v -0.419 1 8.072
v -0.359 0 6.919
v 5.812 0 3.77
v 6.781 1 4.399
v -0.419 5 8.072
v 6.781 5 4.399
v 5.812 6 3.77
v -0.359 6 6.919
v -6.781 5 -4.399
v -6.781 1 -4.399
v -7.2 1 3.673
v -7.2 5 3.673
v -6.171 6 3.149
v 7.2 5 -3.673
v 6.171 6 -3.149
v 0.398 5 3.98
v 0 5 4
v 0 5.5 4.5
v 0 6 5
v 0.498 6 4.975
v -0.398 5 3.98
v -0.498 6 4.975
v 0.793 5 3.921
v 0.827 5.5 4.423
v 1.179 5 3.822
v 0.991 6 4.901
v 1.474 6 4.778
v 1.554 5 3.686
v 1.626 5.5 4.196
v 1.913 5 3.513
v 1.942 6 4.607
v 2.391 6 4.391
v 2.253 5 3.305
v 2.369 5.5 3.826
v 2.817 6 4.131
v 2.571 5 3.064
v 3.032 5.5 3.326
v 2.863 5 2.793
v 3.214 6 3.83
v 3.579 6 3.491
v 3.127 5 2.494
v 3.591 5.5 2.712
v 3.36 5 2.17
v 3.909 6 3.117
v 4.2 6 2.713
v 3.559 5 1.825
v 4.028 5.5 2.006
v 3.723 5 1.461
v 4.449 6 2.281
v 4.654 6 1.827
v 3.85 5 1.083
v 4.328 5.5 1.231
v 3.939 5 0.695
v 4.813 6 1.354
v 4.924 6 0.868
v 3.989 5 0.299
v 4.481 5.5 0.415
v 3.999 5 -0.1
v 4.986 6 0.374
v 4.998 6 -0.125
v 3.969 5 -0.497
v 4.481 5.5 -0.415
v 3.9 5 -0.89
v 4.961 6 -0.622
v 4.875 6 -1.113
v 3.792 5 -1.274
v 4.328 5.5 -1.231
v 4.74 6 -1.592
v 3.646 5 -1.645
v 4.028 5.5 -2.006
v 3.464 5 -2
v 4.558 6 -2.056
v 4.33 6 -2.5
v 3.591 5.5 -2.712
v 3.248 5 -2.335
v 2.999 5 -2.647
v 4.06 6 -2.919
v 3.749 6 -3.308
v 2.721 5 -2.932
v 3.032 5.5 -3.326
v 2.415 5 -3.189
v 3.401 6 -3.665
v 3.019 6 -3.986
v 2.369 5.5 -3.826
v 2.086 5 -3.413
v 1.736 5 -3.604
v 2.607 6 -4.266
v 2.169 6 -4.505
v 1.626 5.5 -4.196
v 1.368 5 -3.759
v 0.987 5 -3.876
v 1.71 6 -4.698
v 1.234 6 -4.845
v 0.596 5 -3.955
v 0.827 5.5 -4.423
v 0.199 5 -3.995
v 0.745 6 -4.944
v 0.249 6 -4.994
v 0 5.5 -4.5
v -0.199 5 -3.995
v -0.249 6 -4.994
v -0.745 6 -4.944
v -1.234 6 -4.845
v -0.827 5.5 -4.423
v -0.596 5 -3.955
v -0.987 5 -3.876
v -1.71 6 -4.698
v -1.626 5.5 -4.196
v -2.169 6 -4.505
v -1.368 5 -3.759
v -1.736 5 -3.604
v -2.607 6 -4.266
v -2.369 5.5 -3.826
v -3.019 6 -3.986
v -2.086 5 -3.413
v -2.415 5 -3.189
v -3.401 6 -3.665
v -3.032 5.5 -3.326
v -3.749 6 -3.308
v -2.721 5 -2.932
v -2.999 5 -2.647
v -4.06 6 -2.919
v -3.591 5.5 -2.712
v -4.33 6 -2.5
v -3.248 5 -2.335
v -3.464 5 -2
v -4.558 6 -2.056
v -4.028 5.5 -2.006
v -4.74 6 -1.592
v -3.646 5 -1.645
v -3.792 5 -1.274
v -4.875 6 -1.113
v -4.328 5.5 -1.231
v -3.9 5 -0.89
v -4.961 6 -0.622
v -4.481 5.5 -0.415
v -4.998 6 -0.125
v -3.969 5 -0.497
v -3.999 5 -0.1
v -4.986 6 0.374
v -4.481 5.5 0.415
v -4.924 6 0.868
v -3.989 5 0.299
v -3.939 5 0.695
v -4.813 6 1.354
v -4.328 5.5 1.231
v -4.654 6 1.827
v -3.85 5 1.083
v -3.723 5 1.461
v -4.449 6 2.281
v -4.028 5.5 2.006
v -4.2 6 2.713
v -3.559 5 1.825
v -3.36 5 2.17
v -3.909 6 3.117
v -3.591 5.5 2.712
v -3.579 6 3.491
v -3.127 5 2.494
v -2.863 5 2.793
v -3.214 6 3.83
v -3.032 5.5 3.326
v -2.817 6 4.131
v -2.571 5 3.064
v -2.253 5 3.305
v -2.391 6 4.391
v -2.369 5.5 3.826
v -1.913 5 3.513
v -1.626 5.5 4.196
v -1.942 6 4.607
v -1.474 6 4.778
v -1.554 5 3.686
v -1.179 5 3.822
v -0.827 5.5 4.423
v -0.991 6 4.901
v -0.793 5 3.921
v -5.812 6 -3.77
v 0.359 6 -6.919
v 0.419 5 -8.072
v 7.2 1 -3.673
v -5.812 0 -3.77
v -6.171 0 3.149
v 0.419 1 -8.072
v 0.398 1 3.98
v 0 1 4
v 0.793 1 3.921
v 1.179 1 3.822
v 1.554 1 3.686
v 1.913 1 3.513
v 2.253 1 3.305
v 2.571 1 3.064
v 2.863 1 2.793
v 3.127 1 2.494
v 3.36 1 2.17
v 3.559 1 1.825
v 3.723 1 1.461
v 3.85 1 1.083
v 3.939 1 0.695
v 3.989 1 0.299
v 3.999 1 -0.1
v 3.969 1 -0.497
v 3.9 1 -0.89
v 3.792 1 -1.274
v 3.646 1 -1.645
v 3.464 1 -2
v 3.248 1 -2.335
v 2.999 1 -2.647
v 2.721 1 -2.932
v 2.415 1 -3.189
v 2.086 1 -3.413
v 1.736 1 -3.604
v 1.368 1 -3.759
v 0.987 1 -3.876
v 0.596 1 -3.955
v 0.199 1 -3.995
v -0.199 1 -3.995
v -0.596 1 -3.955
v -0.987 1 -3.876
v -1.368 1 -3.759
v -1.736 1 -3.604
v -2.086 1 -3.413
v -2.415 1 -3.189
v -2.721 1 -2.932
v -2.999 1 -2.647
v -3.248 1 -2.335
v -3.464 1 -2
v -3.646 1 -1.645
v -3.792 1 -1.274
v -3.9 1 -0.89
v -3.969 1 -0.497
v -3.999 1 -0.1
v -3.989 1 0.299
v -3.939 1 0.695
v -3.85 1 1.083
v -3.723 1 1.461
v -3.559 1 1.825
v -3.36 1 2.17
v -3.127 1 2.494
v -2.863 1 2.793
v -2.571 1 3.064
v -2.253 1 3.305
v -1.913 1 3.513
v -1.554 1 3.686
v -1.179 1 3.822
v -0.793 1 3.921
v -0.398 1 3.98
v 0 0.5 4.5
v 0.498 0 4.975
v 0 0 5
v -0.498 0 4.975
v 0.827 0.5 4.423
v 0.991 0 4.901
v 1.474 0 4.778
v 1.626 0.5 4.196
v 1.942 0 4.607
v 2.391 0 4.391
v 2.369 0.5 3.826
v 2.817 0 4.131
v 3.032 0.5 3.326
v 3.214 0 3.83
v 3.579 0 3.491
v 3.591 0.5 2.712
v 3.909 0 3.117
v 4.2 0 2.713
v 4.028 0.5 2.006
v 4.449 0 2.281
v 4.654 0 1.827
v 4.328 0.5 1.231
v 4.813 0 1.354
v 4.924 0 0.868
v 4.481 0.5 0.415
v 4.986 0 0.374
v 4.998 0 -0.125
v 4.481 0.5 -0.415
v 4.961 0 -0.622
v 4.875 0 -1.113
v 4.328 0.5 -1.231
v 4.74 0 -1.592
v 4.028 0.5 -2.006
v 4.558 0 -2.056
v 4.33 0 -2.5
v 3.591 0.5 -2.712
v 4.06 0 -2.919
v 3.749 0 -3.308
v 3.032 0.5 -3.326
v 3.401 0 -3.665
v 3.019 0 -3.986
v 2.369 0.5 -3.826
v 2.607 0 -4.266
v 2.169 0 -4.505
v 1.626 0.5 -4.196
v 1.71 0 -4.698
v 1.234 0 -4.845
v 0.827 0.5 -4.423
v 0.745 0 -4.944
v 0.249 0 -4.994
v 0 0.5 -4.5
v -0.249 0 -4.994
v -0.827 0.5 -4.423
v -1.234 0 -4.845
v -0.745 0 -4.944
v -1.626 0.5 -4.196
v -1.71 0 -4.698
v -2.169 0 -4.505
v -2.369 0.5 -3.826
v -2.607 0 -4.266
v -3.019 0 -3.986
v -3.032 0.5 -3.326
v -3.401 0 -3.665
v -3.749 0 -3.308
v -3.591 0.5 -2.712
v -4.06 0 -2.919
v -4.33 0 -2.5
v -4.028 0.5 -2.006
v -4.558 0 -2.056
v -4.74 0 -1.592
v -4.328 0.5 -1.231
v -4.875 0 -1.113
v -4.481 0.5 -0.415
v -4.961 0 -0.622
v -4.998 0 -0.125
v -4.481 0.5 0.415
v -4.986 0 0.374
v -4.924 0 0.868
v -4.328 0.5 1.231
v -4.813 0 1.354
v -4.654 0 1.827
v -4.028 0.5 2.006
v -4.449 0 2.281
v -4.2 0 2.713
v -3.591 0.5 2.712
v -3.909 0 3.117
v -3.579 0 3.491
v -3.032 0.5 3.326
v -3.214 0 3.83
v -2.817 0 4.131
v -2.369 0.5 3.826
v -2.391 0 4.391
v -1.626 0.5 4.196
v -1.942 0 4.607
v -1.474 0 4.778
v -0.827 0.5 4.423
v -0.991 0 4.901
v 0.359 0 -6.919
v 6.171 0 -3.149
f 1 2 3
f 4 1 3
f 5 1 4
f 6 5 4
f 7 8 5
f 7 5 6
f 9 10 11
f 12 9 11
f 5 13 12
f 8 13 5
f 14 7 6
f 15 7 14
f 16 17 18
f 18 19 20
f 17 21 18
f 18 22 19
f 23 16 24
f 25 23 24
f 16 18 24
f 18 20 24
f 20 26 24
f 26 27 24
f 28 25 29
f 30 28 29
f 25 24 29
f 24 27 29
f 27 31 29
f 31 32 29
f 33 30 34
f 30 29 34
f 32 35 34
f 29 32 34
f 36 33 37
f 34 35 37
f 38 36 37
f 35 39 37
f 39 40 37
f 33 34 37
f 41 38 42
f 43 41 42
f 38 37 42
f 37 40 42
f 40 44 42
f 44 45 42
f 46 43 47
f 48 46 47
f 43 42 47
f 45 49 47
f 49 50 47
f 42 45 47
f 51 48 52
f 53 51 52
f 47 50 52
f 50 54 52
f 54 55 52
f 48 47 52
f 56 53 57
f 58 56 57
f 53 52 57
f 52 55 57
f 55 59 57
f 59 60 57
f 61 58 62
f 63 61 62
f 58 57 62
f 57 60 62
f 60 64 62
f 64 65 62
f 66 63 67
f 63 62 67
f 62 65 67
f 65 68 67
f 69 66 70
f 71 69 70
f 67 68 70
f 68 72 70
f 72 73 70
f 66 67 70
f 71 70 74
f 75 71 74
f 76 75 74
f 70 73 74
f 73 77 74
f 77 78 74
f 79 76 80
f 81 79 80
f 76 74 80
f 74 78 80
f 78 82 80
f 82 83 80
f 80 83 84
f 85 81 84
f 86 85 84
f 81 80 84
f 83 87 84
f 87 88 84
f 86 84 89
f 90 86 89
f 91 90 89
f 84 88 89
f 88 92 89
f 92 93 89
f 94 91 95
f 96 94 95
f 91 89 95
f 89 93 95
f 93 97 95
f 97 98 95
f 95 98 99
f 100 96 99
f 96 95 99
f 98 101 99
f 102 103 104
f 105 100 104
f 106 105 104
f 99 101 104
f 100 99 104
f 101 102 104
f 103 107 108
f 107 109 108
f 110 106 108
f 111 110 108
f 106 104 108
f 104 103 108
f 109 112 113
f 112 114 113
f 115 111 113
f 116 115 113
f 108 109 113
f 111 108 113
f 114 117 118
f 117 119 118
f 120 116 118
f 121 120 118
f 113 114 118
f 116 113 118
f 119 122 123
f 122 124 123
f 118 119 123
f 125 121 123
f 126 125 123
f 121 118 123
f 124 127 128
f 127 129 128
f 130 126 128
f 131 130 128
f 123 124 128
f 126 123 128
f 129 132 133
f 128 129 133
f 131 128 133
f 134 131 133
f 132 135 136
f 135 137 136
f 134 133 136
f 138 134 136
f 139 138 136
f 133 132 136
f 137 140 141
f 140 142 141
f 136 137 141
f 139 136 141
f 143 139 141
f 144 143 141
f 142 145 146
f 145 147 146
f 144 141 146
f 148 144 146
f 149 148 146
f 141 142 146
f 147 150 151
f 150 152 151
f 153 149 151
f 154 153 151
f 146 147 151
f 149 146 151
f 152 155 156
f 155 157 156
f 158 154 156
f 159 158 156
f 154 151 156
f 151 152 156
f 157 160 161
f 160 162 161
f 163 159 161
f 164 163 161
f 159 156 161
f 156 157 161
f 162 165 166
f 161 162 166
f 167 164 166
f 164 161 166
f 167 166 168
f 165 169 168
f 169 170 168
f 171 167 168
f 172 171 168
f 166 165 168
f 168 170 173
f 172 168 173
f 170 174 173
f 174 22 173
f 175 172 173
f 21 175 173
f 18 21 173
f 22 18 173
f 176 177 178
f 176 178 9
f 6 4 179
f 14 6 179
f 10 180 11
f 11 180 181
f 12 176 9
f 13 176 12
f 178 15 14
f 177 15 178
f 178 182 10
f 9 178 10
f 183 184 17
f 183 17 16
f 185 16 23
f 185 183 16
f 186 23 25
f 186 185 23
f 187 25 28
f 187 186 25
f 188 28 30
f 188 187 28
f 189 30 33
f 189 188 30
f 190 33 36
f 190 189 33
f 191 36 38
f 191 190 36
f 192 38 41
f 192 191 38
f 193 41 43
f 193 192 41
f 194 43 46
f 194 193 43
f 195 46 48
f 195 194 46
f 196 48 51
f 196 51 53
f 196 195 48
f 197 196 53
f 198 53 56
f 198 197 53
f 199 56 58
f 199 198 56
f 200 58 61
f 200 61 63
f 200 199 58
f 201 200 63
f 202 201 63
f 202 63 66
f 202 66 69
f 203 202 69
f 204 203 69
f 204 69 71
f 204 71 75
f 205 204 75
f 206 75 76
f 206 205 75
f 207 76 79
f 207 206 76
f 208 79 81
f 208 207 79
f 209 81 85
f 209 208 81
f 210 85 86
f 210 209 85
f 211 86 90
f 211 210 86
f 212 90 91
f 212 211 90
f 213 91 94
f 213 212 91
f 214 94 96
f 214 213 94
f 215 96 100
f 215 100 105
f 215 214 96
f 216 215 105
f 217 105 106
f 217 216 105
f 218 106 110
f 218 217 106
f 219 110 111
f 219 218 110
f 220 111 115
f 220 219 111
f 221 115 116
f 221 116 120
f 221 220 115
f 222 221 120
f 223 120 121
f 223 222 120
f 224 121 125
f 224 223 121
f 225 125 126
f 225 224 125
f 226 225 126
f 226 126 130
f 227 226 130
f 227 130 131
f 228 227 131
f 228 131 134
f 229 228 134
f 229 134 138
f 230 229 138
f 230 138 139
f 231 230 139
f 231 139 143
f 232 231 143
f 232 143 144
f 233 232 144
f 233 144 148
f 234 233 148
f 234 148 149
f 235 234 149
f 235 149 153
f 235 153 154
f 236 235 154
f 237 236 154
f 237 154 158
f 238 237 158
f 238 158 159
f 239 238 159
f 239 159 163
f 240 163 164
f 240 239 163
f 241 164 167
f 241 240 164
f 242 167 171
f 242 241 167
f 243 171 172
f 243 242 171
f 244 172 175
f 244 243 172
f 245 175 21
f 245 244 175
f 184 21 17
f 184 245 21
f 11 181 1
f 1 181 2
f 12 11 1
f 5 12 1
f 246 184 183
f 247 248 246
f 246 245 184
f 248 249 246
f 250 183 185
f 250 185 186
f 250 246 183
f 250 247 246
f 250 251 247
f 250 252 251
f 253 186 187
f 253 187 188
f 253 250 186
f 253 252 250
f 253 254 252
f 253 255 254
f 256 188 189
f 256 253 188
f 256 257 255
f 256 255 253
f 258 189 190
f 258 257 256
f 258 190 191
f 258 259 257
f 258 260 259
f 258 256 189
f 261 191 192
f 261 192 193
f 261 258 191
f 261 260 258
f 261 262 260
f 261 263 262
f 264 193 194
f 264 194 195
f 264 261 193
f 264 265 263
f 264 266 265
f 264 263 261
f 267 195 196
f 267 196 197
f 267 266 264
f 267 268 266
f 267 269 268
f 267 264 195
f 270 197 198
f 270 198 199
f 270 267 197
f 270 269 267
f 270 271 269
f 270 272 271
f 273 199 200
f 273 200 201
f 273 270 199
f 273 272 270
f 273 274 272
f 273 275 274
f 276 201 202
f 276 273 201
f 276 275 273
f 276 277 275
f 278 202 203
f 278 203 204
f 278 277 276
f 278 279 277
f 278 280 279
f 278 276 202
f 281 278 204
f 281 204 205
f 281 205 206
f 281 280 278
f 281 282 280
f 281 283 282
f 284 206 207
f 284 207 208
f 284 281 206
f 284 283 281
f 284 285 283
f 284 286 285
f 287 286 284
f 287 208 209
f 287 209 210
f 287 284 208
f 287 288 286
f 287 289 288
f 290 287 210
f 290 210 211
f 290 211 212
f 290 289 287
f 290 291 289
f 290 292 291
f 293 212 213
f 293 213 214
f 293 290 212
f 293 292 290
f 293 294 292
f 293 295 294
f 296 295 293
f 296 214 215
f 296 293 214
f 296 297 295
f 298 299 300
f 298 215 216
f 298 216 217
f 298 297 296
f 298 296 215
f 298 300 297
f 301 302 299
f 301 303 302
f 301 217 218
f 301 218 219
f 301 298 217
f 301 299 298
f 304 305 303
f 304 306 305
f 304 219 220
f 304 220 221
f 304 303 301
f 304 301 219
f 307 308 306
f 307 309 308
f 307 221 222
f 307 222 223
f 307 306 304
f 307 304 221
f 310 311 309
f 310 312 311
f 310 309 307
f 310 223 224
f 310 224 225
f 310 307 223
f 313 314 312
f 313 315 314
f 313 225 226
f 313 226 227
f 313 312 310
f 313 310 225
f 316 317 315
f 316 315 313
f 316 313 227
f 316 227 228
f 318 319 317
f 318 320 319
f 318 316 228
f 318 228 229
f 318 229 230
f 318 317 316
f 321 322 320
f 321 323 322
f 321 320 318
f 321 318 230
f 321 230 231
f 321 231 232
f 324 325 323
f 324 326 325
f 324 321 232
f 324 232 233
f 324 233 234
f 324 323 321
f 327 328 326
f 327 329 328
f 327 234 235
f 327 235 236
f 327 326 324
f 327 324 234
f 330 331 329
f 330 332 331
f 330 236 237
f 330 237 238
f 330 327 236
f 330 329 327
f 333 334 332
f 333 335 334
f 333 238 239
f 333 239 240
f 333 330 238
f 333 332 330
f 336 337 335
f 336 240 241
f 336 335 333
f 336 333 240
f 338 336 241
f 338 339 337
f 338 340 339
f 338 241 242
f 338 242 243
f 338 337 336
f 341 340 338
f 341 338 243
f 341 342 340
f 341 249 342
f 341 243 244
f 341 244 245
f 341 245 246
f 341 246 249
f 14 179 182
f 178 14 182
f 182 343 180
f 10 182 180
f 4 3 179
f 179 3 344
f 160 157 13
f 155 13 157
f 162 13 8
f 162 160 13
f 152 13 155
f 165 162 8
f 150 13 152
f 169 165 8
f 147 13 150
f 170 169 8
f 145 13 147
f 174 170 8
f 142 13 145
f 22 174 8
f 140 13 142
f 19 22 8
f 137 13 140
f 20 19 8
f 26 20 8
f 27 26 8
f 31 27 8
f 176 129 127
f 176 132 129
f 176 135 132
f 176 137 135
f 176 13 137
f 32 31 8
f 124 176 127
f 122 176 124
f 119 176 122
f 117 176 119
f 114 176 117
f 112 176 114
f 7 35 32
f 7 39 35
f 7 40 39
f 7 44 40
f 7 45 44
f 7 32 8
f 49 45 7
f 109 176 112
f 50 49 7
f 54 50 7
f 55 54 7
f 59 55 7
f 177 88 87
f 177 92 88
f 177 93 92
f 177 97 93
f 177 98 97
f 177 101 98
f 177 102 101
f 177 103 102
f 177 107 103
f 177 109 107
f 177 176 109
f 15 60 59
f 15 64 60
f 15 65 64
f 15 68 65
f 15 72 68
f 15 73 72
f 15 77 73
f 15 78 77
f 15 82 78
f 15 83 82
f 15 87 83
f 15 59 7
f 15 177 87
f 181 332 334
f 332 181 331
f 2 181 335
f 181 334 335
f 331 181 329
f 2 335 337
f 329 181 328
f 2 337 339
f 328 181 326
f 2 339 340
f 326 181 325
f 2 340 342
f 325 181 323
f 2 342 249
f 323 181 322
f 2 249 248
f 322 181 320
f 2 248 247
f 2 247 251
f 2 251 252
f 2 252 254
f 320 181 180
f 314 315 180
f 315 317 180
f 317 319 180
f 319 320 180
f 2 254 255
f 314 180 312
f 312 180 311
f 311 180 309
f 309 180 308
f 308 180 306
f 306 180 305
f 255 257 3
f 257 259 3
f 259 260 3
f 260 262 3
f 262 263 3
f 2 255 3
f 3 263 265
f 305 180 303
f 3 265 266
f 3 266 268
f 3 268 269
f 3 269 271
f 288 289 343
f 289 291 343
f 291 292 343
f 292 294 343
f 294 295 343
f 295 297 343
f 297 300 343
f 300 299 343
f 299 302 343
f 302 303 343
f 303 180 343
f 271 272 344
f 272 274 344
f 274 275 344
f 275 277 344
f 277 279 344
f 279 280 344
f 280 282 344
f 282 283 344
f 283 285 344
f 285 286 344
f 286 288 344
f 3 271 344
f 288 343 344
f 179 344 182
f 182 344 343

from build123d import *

# Parameters (mm, degrees)
SKETCH1_R           = 4
BOSS_EXTRUDE1_DEPTH = 6
CHAMFER1_SIZE       = 1


with BuildPart() as part:
    # Sketch1 → Boss-Extrude1 (new body)
    with BuildSketch(Plane(origin=(0, 0, 0), x_dir=(1, 0, 0), z_dir=(0, 1, 0))):
        Polygon((6.781243349, -4.398644334), (7.19995941, 3.673406842), (0.418716061, 8.072051176), (-6.781243349, 4.398644334), (-7.19995941, -3.673406842), (-0.418716061, -8.072051176), align=None)
        with Locations(Location((0, 0, 0), (0, 0, 270))):  # turned: the seam where the file's is
            Circle(SKETCH1_R, mode=Mode.SUBTRACT)
    extrude(amount=BOSS_EXTRUDE1_DEPTH)

    # Chamfer1
    chamfer1_edges = [part.edges().sort_by_distance(p)[0] for p in [
        (3.809337736, 6, -5.872729009),
        (-3.181263644, 6, -6.235347755),
        (-6.990601379, 6, -0.362618746),
        (0, 0, -4),
        (0, 6, -4),
        (-3.809337736, 6, 5.872729009),
        (3.181263644, 6, 6.235347755),
        (-3.809337736, 0, 5.872729009),
        (-6.990601379, 0, -0.362618746),
        (-3.181263644, 0, -6.235347755),
        (6.990601379, 6, 0.362618746),
        (3.809337736, 0, -5.872729009),
        (6.990601379, 0, 0.362618746),
        (3.181263644, 0, 6.235347755),
    ]]
    chamfer(chamfer1_edges, length=CHAMFER1_SIZE)


solid = part.part
